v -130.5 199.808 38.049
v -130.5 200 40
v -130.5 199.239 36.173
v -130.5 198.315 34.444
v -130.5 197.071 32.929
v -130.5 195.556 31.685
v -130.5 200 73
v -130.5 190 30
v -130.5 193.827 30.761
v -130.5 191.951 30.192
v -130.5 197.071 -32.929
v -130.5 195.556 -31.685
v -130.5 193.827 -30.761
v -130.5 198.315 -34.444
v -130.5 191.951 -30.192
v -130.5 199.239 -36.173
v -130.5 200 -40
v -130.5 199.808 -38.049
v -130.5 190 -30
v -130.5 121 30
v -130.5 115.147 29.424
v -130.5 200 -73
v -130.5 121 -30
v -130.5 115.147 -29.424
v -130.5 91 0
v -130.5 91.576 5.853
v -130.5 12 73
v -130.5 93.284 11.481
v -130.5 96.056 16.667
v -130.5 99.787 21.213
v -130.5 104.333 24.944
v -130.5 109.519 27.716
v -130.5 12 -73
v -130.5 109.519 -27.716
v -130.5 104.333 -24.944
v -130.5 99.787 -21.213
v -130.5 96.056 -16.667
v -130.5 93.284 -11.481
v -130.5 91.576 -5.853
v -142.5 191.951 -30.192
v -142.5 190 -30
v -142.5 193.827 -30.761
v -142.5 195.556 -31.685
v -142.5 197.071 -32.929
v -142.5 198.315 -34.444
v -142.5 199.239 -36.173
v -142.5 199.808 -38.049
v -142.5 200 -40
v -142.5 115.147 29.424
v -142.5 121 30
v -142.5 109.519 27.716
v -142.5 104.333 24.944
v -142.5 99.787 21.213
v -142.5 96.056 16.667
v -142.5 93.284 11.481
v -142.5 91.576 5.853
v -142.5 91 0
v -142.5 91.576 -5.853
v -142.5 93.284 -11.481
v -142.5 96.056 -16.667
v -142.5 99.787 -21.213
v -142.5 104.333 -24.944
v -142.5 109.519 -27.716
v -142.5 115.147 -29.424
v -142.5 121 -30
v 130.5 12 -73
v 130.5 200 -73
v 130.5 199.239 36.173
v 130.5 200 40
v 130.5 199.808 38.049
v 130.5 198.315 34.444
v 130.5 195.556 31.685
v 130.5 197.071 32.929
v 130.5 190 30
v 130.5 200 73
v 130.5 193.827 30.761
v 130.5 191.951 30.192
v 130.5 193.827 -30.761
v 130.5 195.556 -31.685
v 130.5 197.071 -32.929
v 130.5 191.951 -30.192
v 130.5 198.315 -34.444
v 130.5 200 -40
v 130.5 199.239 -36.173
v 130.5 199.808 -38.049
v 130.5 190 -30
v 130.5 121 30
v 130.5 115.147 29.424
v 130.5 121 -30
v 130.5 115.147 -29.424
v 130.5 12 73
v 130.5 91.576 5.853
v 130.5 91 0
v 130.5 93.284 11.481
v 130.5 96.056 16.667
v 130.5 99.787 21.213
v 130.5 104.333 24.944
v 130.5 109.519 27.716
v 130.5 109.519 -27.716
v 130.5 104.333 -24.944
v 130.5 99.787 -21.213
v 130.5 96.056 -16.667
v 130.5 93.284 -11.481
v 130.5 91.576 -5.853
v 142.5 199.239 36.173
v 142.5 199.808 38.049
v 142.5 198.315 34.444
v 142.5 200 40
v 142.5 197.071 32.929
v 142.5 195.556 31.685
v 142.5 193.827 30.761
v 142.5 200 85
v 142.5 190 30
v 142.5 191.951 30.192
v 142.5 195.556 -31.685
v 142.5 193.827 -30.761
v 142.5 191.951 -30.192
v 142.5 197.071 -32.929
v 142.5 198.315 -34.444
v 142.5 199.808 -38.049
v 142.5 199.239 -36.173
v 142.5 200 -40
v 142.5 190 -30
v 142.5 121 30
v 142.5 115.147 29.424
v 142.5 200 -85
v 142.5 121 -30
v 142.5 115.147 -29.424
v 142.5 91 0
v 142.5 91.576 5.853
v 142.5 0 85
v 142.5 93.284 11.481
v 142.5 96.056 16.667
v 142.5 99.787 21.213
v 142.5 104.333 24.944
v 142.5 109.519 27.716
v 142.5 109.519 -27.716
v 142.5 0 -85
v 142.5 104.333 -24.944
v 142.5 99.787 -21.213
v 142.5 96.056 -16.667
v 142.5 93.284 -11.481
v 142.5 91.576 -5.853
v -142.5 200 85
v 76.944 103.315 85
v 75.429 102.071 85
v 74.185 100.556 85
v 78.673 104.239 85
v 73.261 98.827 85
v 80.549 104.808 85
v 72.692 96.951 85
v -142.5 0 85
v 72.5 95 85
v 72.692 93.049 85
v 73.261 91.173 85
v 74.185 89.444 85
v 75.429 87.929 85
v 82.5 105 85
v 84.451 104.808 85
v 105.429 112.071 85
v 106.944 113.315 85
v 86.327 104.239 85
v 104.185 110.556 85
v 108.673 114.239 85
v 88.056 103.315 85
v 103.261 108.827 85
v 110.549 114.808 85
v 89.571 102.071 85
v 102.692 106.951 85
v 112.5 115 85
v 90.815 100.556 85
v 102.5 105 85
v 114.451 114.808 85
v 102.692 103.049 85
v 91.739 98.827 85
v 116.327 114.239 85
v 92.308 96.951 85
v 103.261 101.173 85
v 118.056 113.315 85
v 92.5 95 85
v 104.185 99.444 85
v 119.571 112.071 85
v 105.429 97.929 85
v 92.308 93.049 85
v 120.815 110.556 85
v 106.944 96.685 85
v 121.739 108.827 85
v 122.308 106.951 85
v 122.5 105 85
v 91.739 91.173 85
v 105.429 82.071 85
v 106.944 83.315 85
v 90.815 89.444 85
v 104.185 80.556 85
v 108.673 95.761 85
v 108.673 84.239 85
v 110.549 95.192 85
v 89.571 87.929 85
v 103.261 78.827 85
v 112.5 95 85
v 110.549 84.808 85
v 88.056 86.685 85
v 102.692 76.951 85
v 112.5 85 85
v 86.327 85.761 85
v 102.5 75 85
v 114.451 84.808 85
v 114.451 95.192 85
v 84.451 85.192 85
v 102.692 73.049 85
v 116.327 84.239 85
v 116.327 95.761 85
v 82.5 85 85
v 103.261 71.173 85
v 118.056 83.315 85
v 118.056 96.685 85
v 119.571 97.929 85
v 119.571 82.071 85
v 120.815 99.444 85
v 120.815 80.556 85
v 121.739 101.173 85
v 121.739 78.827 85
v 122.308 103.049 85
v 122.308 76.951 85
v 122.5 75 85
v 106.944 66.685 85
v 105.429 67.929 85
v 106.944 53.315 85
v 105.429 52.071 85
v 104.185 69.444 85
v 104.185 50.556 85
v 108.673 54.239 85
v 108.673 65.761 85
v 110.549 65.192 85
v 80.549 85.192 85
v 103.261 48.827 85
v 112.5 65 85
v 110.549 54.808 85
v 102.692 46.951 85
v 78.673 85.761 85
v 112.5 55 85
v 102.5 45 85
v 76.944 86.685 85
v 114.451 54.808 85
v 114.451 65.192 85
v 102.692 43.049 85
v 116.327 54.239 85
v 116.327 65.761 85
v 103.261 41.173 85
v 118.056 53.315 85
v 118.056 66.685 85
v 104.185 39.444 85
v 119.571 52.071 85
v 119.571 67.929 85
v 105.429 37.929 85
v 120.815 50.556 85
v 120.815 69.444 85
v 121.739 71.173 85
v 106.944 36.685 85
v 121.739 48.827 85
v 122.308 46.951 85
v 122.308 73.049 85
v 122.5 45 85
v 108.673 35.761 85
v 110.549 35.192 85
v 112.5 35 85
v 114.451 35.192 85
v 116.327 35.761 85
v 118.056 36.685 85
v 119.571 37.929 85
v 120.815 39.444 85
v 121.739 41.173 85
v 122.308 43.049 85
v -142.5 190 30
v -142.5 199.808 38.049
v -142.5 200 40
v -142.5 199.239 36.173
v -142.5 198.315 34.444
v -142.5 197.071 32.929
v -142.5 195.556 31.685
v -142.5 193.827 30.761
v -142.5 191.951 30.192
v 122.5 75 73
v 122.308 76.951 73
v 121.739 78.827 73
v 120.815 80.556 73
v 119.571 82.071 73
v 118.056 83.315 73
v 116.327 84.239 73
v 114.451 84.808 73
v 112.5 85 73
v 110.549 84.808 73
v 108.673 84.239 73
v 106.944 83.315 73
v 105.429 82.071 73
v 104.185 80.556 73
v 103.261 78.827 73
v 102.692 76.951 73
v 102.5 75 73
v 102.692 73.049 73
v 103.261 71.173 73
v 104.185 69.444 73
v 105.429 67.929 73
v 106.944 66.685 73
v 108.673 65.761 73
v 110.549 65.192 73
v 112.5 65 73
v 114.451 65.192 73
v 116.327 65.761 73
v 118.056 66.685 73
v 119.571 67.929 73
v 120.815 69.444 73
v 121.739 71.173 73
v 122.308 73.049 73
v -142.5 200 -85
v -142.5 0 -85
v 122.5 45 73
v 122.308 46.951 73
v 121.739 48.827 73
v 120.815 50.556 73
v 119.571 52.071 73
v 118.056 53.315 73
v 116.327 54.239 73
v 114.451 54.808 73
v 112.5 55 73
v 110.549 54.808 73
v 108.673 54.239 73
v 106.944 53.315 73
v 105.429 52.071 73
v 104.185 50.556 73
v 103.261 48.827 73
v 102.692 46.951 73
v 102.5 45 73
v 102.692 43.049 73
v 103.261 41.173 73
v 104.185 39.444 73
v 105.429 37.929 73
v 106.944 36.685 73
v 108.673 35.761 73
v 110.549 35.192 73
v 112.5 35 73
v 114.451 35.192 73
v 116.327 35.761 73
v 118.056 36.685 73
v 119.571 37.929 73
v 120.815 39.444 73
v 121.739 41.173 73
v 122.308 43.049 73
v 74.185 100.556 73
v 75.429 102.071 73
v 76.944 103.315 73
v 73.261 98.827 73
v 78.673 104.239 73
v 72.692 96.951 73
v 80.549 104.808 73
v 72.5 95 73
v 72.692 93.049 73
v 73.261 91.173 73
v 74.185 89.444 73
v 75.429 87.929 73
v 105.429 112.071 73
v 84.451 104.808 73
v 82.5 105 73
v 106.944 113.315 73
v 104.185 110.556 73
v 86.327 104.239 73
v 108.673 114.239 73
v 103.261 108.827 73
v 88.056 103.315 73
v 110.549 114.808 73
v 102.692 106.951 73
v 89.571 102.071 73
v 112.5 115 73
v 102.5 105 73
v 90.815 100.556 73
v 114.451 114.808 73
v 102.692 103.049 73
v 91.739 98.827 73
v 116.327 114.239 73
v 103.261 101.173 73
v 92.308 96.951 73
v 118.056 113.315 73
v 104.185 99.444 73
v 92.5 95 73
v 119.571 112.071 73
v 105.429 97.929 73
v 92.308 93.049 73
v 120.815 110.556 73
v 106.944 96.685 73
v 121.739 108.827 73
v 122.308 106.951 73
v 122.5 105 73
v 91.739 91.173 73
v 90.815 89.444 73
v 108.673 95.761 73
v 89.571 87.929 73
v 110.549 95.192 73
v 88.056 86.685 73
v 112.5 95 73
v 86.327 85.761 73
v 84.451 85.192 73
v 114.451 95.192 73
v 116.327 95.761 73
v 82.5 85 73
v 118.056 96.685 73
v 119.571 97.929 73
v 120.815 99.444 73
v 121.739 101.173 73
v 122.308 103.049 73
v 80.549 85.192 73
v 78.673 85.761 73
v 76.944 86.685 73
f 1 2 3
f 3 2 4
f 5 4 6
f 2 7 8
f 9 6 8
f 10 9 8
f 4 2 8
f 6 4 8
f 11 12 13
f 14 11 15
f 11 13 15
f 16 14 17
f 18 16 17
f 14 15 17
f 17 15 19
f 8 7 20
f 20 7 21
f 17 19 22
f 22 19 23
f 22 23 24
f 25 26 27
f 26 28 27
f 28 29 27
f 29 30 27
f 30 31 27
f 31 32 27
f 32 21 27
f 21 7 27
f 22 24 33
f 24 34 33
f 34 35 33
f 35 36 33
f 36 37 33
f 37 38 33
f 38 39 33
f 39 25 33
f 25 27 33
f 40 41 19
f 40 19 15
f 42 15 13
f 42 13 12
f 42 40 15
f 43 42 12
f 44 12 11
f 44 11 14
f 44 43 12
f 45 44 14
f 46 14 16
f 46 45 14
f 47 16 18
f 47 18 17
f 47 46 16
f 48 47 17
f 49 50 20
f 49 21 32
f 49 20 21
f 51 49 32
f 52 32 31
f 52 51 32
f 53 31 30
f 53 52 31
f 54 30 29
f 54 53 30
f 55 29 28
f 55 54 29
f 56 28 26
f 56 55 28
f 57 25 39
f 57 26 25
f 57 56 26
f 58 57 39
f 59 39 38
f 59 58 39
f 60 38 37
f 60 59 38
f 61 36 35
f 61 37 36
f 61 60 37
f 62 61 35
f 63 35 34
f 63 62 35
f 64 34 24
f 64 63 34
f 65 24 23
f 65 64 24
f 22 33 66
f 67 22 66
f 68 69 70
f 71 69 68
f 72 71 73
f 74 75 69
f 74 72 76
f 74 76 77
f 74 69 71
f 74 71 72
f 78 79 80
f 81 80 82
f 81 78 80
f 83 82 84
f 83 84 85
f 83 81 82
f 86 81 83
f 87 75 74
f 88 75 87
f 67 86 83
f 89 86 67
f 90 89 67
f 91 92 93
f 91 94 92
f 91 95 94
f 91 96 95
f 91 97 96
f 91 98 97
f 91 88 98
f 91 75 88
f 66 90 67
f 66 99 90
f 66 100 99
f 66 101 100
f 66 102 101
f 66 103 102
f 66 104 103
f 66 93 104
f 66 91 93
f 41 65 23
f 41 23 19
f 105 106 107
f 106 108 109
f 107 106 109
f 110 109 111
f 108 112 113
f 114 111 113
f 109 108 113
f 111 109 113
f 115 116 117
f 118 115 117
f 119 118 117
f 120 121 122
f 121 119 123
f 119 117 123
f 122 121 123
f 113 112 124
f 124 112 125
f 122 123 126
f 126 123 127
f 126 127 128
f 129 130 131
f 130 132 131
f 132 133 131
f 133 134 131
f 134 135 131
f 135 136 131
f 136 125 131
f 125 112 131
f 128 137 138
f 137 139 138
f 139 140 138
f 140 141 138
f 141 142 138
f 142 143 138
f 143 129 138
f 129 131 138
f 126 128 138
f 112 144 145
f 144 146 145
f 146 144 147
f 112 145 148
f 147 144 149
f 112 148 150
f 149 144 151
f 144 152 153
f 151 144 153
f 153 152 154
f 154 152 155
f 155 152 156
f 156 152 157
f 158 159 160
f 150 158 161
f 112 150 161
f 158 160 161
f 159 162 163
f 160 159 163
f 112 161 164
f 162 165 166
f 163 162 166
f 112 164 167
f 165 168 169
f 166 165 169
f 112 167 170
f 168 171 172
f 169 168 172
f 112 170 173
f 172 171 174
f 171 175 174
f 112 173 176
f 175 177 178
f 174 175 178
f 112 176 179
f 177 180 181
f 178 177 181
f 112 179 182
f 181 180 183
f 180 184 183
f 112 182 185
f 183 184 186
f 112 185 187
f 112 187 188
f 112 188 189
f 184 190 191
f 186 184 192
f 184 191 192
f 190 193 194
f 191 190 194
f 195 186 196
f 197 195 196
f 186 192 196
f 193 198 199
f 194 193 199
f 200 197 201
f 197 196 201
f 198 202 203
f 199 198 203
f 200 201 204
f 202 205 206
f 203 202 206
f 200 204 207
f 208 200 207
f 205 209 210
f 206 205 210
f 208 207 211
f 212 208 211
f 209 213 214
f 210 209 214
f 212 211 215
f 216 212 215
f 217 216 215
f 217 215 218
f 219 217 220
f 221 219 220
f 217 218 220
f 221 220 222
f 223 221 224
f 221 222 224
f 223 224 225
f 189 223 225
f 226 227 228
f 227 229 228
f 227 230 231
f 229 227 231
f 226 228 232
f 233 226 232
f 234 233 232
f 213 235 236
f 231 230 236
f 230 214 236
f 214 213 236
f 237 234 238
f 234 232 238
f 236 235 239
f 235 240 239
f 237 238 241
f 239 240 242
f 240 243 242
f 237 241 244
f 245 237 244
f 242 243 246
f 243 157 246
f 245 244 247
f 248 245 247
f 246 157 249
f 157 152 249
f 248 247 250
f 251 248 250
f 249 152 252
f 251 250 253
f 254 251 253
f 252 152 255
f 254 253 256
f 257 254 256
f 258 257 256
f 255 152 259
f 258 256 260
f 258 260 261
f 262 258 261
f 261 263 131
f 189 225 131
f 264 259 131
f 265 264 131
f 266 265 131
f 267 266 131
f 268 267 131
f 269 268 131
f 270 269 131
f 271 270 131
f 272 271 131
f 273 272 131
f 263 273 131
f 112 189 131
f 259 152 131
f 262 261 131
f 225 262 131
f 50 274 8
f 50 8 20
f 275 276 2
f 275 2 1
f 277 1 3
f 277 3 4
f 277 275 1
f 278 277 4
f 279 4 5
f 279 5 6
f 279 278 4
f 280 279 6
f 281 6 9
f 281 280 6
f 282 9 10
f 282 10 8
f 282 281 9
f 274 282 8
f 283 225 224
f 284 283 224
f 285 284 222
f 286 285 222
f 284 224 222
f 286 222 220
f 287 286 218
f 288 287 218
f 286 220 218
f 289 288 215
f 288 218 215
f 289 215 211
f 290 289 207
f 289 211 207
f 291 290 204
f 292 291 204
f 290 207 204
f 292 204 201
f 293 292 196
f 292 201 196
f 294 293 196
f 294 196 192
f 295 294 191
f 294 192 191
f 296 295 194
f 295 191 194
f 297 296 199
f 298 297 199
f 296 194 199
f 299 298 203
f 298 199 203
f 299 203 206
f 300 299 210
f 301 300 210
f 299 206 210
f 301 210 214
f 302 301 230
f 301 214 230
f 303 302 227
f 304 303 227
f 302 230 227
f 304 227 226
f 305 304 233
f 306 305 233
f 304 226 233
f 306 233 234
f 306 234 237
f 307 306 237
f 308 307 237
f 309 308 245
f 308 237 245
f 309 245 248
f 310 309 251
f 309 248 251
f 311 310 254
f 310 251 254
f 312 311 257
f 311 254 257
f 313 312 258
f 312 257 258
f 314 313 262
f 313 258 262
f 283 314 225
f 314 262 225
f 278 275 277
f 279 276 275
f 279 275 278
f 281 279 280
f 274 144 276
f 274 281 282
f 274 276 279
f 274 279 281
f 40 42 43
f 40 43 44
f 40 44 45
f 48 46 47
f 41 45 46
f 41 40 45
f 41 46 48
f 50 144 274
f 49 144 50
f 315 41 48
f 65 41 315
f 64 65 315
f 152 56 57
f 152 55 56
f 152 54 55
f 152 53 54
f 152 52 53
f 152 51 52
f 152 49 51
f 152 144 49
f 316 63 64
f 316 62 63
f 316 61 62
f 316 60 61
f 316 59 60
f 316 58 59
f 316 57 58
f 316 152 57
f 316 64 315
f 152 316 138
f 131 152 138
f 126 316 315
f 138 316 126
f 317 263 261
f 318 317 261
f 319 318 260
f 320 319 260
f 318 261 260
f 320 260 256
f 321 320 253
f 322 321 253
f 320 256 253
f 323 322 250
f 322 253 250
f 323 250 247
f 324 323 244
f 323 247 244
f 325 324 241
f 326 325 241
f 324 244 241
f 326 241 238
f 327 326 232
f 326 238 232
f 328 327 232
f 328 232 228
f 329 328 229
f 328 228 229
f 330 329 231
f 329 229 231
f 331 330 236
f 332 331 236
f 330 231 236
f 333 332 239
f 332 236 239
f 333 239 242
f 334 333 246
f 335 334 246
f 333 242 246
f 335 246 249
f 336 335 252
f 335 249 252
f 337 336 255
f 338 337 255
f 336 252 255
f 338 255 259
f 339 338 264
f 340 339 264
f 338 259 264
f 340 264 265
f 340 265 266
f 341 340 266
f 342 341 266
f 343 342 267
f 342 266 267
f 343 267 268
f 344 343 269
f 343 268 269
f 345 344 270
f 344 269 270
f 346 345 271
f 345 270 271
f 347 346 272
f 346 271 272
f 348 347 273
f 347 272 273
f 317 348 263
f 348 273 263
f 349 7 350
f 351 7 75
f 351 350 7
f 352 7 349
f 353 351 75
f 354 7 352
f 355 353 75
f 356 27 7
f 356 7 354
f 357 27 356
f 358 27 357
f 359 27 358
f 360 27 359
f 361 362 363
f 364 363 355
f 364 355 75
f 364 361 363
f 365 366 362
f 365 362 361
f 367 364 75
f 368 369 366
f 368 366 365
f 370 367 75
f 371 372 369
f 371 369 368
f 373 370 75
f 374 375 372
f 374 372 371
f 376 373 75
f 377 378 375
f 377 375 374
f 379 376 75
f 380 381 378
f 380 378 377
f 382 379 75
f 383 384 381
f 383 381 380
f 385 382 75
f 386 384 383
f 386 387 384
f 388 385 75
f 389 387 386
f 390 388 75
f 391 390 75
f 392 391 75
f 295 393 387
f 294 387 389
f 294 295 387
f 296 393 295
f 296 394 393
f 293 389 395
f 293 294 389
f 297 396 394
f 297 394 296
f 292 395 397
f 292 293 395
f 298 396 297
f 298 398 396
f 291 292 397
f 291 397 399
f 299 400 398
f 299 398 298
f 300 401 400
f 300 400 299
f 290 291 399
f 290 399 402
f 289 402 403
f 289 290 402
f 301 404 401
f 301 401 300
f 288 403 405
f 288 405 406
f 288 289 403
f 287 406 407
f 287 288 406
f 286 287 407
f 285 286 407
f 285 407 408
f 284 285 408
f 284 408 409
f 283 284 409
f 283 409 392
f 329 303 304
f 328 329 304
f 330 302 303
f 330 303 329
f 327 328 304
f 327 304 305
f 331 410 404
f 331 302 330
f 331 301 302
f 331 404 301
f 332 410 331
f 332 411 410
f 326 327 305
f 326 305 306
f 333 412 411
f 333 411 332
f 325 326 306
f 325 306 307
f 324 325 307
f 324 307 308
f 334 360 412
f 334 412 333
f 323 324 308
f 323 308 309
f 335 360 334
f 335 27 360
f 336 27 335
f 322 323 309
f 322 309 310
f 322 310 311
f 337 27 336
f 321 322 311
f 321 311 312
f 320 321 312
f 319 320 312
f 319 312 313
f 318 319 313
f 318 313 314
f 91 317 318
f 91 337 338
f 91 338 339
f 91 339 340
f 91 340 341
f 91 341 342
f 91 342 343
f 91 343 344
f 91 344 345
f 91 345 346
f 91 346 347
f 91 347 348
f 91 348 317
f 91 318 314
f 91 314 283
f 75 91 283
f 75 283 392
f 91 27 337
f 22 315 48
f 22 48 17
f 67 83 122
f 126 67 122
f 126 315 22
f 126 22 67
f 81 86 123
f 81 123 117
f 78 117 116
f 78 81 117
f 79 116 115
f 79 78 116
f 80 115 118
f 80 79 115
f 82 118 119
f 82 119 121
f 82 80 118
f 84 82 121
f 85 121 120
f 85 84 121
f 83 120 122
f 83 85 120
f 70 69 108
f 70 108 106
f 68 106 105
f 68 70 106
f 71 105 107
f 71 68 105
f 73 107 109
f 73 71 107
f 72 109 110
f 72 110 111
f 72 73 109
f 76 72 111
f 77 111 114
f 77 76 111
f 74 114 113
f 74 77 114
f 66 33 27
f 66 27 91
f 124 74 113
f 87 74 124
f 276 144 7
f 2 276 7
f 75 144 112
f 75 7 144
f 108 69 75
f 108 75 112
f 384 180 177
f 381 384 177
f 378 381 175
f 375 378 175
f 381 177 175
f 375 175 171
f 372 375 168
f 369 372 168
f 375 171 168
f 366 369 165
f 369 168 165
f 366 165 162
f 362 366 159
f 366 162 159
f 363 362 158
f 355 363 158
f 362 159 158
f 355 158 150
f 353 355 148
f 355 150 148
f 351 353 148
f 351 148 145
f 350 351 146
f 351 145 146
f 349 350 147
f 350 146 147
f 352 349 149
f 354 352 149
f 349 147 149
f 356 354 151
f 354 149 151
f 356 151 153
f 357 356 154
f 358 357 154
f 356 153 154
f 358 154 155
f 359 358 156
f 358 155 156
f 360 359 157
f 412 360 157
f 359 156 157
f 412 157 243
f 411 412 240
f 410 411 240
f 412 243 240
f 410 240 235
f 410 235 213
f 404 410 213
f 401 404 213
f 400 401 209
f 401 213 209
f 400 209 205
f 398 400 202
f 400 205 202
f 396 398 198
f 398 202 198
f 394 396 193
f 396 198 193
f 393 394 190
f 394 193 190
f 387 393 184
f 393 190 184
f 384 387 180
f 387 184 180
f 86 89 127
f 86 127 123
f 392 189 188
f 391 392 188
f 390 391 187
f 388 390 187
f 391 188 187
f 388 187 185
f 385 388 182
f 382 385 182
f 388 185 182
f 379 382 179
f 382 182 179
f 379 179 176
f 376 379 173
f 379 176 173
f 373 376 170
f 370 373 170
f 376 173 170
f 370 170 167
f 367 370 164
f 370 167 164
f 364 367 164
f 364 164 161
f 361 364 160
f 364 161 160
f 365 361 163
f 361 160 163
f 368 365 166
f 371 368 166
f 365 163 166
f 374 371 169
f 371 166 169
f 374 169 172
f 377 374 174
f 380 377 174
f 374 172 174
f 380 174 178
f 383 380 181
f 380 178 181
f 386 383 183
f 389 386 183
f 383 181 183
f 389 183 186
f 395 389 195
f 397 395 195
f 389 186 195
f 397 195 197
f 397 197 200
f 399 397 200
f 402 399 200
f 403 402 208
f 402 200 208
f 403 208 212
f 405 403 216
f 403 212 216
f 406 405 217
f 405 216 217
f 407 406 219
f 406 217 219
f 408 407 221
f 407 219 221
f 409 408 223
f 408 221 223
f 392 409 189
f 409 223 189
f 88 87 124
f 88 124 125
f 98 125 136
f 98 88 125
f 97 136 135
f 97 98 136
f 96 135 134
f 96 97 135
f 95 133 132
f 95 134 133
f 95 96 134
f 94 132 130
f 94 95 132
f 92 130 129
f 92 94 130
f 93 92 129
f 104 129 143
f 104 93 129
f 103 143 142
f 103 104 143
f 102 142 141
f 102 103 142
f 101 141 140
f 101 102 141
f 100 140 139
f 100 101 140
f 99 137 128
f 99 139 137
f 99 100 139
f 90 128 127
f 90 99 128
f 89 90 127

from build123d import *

# Parameters (mm, degrees)
SKETCH1_W               = 285
SKETCH1_H               = 170
BOSS_EXTRUDE1_DEPTH     = 200
SHELL1_T                = -12
CUT_EXTRUDE1_DEPTH      = 359.399218749
CUT_EXTRUDE1_DEPTH_BACK = 359.399218749
SKETCH4_R               = 10
CUT_EXTRUDE2_DEPTH      = 12


with BuildPart() as part:
    # Sketch1 → Boss-Extrude1 (new body)
    with BuildSketch(Plane(origin=(0, 0, 0), x_dir=(1, 0, 0), z_dir=(0, 1, 0))):
        Rectangle(SKETCH1_W, SKETCH1_H)
    extrude(amount=BOSS_EXTRUDE1_DEPTH)

    # Shell1
    shell1_openings = [part.faces().sort_by_distance(p)[0] for p in [
        (0, 200, 0),
    ]]
    offset(amount=SHELL1_T, openings=shell1_openings, kind=Kind.INTERSECTION)

    # Sketch2 → Cut-Extrude1 (cut, two sides: drawn at the far end of the back side and taken through both)
    with BuildSketch(Plane(origin=(142.5, 0, 0), x_dir=(0, 0, -1), z_dir=(1, 0, 0)).offset(-CUT_EXTRUDE1_DEPTH_BACK)):
        with BuildLine():
            Line((-30, 190), (-30, 121))
            ThreePointArc((-30, 121), (0, 91), (30, 121))
            Line((30, 121), (30, 190))
            ThreePointArc((30, 190), (32.928932188, 197.071067812), (40, 200))
            Line((40, 200), (-40, 200))
            ThreePointArc((-40, 200), (-32.928932188, 197.071067812), (-30, 190))
        make_face()
    extrude(amount=CUT_EXTRUDE1_DEPTH + CUT_EXTRUDE1_DEPTH_BACK, mode=Mode.SUBTRACT)

    # Sketch4 → Cut-Extrude2 (cut)
    with BuildSketch(Plane.XY.offset(85)):
        with Locations((112.5, 105)):
            Circle(SKETCH4_R)
        with Locations((112.5, 75)):
            Circle(SKETCH4_R)
        with Locations((112.5, 45)):
            Circle(SKETCH4_R)
        with Locations((82.5, 95)):
            Circle(SKETCH4_R)
    extrude(amount=-CUT_EXTRUDE2_DEPTH, mode=Mode.SUBTRACT)


solid = part.part
